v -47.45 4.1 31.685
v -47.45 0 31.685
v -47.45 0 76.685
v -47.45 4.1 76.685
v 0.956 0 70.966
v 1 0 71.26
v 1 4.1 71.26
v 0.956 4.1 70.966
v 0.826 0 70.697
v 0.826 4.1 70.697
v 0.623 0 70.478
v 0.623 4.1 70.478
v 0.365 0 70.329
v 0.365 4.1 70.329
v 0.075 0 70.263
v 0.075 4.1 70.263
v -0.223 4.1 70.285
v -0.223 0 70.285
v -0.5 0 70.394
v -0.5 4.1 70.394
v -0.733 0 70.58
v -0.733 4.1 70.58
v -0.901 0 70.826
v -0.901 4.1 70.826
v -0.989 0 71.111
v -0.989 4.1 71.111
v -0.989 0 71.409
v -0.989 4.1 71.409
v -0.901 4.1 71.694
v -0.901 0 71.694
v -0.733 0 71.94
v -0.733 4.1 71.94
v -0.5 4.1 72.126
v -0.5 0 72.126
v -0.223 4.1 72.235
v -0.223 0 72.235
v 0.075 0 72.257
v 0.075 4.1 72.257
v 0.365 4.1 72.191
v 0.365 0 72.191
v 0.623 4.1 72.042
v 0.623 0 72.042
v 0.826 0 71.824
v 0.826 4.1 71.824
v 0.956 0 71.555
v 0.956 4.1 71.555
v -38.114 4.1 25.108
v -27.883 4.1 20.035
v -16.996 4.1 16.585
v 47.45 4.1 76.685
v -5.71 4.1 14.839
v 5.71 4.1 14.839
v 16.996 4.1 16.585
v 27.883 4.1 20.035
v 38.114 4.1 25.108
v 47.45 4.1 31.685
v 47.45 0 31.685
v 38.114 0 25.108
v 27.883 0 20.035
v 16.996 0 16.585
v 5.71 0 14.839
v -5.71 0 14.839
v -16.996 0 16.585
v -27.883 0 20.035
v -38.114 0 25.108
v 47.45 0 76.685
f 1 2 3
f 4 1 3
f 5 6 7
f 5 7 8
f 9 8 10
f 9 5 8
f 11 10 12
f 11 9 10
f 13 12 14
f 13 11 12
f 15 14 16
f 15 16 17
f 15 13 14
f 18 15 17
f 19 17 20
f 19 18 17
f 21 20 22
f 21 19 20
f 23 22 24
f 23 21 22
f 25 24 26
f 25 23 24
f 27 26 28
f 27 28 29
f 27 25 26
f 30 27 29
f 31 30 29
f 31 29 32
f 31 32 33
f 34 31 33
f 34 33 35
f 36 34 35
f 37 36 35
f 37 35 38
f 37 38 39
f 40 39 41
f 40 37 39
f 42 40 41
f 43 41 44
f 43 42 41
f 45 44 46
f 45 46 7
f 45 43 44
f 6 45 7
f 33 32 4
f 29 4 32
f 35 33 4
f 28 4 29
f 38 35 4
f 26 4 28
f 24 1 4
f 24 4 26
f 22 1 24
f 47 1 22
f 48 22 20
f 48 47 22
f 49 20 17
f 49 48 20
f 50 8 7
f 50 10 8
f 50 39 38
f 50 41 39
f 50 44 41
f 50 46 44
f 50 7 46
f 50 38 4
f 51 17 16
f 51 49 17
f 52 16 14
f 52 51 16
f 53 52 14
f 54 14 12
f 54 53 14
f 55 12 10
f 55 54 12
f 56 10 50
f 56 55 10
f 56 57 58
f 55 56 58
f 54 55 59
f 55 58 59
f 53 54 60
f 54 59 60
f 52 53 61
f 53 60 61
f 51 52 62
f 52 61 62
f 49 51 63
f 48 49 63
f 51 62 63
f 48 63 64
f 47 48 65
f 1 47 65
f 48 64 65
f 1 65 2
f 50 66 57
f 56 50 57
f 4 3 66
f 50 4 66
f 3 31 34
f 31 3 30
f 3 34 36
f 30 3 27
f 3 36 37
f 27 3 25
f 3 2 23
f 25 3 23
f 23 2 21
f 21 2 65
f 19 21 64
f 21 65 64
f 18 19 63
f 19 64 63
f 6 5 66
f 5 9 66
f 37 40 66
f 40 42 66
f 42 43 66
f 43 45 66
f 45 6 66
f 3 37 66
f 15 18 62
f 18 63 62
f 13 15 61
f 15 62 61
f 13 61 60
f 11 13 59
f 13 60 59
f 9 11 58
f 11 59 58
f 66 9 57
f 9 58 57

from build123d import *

# Parameters (mm, degrees)
SKETCH1_R           = 1
BOSS_EXTRUDE1_DEPTH = 4.1


with BuildPart() as part:
    # Sketch1 → Boss-Extrude1 (new body)
    with BuildSketch(Plane(origin=(0, 0, 0), x_dir=(1, 0, 0), z_dir=(0, 1, 0))):
        with BuildLine():
            Line((-47.45, -31.685353535), (-47.45, -76.685353535))
            Line((-47.45, -76.685353535), (47.45, -76.685353535))
            Line((47.45, -76.685353535), (47.45, -31.685353535))
            ThreePointArc((47.45, -31.685353535), (0, -14.620077353), (-47.45, -31.685353535))
        make_face()
        with Locations((0, -71.260285785)):
            Circle(SKETCH1_R, mode=Mode.SUBTRACT)
    extrude(amount=BOSS_EXTRUDE1_DEPTH)


solid = part.part
